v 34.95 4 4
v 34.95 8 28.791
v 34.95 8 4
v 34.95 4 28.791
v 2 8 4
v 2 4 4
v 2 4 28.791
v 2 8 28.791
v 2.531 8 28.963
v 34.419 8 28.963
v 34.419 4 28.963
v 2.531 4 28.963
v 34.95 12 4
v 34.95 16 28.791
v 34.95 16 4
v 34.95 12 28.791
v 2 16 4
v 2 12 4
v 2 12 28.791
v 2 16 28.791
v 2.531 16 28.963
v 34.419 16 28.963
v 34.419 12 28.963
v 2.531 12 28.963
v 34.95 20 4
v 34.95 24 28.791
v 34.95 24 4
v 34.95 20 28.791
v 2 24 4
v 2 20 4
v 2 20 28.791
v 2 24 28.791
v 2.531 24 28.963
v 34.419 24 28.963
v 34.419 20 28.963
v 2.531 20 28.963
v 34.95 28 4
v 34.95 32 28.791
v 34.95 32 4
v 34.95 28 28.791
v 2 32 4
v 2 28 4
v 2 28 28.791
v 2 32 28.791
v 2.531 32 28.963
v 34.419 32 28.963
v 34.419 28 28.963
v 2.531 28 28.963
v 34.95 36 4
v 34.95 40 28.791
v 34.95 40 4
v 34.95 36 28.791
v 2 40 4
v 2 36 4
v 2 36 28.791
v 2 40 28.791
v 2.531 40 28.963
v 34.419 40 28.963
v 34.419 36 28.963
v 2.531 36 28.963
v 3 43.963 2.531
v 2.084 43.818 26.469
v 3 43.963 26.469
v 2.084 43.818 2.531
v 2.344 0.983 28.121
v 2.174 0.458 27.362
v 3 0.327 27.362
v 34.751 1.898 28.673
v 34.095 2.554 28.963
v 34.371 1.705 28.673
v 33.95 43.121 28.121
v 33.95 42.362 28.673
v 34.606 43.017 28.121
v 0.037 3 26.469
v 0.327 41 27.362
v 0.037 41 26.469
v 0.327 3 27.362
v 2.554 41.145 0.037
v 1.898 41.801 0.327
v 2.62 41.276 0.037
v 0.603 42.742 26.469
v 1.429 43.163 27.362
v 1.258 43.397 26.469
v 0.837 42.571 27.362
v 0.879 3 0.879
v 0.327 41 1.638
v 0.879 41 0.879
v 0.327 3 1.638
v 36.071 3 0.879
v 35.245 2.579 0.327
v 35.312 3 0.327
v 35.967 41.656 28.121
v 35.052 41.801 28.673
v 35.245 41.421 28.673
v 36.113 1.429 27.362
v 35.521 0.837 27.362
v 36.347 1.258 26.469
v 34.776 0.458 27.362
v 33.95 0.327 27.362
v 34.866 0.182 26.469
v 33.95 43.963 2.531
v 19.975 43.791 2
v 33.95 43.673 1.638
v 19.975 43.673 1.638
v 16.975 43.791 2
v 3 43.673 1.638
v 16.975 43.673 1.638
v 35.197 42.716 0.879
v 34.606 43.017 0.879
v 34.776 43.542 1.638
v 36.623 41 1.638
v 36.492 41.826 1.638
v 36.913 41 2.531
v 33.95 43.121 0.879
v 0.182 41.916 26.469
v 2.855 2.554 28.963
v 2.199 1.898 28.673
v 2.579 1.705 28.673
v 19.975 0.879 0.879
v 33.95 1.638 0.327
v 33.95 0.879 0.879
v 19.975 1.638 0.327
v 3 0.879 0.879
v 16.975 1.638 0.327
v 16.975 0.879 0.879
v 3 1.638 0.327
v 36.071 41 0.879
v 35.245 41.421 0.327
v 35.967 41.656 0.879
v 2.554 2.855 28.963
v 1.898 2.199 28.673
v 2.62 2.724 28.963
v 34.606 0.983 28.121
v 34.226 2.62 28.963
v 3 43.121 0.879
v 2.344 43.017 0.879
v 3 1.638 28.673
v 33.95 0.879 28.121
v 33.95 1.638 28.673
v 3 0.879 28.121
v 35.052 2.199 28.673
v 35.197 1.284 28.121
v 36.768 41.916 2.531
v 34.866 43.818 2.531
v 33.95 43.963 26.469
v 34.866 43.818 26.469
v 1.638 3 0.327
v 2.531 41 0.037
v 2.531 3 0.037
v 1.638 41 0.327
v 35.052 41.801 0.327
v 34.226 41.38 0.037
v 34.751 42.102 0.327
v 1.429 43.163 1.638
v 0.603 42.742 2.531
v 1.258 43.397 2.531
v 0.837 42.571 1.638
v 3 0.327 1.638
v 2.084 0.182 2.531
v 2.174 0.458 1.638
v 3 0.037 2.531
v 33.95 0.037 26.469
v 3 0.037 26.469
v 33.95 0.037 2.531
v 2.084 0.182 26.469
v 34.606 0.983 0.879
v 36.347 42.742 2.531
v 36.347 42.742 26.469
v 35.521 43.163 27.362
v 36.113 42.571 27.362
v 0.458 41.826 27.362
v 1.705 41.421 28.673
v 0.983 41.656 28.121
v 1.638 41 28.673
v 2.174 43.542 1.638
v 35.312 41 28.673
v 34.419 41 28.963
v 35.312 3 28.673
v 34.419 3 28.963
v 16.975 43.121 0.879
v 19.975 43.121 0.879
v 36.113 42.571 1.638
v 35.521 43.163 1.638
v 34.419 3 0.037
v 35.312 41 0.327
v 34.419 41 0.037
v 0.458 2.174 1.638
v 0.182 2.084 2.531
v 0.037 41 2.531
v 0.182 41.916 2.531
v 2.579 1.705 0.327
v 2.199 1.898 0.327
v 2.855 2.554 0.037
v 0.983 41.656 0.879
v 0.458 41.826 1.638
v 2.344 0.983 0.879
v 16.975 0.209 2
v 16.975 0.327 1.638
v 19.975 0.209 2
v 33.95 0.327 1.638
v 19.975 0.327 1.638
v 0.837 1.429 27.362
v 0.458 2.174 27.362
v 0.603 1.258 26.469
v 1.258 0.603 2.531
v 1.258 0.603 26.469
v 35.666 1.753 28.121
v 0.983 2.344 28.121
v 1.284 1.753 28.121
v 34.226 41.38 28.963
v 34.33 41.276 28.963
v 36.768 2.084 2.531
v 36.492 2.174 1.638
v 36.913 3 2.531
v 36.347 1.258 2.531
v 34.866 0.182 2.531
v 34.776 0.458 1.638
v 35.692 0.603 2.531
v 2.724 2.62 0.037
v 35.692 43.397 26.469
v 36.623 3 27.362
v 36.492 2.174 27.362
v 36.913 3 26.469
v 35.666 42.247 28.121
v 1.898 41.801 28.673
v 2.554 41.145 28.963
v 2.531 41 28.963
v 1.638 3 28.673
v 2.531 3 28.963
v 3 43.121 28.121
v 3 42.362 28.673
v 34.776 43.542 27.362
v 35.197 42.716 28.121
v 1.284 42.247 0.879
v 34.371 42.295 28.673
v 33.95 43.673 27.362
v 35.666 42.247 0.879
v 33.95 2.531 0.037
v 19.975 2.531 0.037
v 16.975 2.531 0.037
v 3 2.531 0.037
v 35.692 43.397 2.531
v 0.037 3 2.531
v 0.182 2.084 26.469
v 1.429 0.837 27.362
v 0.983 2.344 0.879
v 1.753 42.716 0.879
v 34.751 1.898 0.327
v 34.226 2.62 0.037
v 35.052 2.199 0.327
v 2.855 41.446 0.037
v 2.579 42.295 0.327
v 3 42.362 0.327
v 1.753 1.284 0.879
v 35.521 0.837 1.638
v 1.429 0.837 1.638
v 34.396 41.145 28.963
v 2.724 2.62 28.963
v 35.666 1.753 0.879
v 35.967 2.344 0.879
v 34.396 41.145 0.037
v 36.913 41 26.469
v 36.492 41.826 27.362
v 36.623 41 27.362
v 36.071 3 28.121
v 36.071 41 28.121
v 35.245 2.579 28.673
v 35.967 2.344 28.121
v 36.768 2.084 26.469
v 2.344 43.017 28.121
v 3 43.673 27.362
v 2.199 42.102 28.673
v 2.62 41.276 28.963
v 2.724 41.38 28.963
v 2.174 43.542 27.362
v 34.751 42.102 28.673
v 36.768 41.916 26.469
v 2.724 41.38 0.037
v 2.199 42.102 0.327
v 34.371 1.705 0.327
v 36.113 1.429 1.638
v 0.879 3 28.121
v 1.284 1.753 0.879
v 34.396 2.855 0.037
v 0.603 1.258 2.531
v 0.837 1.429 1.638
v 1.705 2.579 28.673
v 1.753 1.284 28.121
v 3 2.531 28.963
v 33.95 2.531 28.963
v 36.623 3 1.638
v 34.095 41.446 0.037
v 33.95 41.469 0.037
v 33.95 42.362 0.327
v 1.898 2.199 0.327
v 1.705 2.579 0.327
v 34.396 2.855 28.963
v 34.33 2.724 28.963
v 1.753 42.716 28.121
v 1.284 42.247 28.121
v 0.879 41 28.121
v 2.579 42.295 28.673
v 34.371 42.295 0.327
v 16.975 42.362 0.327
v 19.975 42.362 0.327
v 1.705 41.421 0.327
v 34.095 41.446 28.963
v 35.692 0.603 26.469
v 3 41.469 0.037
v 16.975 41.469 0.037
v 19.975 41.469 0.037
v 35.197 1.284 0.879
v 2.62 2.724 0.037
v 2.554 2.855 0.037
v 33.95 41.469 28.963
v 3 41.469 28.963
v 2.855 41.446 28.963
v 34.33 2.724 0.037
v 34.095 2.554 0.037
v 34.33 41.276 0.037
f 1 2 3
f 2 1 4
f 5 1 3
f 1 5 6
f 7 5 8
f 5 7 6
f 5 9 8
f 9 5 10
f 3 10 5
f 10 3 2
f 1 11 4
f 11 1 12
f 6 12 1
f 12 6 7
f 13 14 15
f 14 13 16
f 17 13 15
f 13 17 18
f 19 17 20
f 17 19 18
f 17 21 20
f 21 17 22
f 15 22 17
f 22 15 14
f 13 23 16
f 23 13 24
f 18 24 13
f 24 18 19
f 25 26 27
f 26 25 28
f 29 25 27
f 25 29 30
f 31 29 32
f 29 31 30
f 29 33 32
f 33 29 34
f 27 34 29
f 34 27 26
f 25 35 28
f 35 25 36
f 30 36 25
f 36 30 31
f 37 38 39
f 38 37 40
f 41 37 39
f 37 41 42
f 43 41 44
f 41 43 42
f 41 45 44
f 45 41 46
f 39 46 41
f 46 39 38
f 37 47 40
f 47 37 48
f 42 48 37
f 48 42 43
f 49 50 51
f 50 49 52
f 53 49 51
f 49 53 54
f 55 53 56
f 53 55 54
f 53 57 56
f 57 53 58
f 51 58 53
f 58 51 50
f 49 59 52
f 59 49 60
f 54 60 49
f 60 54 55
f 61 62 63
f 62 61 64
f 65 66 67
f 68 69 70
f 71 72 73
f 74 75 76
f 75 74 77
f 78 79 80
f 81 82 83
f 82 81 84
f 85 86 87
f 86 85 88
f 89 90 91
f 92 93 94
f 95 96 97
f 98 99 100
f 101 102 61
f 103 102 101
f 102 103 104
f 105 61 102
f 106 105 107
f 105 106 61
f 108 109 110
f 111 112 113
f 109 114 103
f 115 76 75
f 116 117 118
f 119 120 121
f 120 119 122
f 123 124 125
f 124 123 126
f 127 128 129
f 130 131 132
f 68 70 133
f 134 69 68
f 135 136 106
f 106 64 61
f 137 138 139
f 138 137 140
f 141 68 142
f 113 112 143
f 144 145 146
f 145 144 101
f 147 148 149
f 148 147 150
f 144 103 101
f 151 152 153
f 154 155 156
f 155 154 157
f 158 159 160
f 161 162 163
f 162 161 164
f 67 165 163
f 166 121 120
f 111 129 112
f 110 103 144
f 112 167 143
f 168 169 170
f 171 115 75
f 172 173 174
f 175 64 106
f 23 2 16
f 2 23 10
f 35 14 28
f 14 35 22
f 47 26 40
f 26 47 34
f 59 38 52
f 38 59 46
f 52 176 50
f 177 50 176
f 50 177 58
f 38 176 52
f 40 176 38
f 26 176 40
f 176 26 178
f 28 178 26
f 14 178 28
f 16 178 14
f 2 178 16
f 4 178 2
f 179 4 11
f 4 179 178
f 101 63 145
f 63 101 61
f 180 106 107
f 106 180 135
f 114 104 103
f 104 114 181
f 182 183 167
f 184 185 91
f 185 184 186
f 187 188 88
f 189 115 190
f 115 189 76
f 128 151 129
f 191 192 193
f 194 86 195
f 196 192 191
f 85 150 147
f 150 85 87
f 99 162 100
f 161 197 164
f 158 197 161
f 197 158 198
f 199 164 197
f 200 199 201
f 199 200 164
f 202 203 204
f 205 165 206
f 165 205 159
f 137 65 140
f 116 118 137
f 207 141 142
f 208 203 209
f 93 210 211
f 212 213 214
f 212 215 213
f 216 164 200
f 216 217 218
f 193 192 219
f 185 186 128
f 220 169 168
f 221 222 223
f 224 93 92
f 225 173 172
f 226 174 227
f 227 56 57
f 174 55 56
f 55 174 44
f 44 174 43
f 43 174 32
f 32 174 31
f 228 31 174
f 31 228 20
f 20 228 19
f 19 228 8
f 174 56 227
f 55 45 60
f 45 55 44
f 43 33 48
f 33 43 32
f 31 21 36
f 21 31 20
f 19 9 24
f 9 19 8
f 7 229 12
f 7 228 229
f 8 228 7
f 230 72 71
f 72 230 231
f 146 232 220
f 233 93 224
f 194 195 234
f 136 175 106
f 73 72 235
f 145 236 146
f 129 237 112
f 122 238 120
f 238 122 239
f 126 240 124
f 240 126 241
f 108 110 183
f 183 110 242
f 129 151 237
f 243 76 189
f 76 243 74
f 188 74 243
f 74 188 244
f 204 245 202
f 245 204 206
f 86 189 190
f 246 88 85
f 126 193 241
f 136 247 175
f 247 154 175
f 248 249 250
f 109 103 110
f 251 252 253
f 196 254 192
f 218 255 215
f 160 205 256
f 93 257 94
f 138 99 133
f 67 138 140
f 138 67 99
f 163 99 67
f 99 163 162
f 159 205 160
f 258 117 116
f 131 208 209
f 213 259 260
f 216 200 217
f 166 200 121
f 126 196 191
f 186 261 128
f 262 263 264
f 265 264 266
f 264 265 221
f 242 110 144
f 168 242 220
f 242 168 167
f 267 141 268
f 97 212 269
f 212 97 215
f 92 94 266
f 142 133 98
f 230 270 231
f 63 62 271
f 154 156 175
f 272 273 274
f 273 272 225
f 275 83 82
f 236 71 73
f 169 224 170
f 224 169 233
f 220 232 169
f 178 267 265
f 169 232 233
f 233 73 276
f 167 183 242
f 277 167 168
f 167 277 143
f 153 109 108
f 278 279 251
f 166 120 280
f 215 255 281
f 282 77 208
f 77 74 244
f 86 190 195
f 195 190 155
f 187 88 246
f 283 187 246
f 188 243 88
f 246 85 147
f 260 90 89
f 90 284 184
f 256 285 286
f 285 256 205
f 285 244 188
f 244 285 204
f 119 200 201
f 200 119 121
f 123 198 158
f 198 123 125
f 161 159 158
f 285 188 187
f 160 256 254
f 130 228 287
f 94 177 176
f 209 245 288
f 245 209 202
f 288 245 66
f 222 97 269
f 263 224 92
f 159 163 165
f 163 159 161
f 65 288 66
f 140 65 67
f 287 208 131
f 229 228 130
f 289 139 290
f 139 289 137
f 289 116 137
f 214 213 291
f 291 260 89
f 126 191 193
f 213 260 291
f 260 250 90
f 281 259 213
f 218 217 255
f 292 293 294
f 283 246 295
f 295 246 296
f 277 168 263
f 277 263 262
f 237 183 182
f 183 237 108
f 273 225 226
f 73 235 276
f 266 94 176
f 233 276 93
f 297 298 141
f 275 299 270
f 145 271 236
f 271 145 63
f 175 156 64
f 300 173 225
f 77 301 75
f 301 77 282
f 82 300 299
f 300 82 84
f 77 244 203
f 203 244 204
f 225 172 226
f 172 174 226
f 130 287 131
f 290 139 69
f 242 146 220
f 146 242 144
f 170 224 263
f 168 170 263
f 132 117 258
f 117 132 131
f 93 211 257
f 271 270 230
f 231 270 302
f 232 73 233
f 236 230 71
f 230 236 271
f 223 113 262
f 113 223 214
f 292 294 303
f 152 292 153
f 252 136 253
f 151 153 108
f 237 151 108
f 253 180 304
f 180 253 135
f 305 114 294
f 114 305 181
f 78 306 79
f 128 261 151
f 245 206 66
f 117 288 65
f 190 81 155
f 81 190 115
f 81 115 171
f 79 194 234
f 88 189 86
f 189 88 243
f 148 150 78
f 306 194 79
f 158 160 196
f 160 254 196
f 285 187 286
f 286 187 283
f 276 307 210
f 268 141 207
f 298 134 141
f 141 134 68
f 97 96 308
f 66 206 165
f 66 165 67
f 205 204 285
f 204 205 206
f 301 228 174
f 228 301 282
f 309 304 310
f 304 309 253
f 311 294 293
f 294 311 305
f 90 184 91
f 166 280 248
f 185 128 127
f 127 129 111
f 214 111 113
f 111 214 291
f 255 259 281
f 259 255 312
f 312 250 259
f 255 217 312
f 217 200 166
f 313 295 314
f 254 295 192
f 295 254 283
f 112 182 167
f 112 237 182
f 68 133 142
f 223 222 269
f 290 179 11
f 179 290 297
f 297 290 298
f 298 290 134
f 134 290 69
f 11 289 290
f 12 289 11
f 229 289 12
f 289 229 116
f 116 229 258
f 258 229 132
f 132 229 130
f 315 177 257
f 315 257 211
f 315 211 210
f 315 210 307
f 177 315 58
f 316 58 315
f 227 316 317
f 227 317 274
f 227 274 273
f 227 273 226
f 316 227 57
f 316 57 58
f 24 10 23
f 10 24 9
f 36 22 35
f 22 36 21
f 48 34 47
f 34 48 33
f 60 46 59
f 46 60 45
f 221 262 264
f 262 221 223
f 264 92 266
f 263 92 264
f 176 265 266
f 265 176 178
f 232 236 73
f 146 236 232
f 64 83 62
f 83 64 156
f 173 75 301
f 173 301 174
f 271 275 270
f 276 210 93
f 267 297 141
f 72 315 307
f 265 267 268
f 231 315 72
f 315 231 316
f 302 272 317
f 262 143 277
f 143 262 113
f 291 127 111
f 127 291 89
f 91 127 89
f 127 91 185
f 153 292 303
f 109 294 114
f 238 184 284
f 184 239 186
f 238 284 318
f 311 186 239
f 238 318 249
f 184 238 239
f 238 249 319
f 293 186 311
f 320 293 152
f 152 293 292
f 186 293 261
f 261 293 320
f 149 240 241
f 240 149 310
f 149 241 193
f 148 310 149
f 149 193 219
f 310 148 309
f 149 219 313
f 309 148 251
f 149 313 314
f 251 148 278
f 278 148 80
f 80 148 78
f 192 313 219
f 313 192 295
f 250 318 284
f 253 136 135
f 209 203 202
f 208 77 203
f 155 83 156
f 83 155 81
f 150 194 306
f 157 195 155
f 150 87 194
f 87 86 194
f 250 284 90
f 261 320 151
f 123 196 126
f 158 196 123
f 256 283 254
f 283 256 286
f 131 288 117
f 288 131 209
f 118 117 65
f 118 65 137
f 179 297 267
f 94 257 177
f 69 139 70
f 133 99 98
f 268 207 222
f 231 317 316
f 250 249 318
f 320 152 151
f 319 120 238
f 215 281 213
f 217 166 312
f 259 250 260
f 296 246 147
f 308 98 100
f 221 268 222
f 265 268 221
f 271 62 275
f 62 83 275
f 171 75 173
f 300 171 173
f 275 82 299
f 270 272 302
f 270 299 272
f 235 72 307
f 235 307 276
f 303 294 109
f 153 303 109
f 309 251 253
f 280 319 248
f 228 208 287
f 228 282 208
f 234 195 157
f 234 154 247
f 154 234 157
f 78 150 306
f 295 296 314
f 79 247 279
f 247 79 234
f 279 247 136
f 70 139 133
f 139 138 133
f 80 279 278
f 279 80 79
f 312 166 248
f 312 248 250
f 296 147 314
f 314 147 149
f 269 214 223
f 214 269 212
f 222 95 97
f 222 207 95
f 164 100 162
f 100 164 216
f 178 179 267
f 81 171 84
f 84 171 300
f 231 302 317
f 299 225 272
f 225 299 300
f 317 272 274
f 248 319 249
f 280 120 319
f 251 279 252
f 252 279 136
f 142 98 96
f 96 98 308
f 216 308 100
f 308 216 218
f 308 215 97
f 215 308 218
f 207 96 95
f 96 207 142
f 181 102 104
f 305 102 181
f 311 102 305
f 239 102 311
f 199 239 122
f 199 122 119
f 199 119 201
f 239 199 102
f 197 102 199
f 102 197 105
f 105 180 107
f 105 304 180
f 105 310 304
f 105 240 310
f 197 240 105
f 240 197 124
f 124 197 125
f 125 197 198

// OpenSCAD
//Constants
stuffz = 2/1;
fuzz = 0.2/1;
real_card_length = 34.95/1;
real_card_width = 32.75/1;
real_card_thick = 3.8/1;
card_length = real_card_length + fuzz;
card_width = real_card_width + fuzz;
card_thick = real_card_thick + fuzz;

//DS Box
box_height_addition = 25; //[10: 32]
gutter_height = 2; //[1:5]
gutter_width = 3; //[1:5]
number_of_cards = 5; //[1:20]
card_spacing = 4; //[2:7]
$fn = 20;
cube_r = 3; //[1 : 5]

box(number_of_cards);

module card(){
  cube([card_width,card_thick,card_length]);
}

module box(number){
  box_x = card_width + stuffz*2;
  box_y = card_spacing + (card_thick + card_spacing) * number;
  box_z = gutter_height+ stuffz + box_height_addition;
  card_x_trans = box_x / 2 - card_width /2;
  //%cube([box_x, box_y, box_z]);
  difference(){
    roundCornerCube(box_x,box_y,box_z,cube_r);
    //gutter
    translate([(box_x/2) - (gutter_width/2),-fuzz,-fuzz]) 
    cube([gutter_width, box_y + (fuzz*2),gutter_height+fuzz]);
    //cards
    for (i = [0 : number-1]){
      #translate([card_x_trans, card_spacing + (card_thick + card_spacing)*i,gutter_height+stuffz]) card();
    }
  }
}

module roundCornerCube(x,y,z,r_sphere){
r = r_sphere;
if (x < r) {echo ("roundCornerCube: error: x < r !!");}
if (y < r) {echo ("roundCornerCube: error: y < r !!");}
if (z < r) {echo ("roundCornerCube: error: z < r !!");}
	hull(){
		translate([r,y-r,z-r]) sphere(r_sphere); //1!
		translate([x-r,y-r,z-r]) sphere(r_sphere); //2
		translate([r,r,z-r]) sphere(r_sphere); //3
		translate([x-r,r,z-r]) sphere(r_sphere); //4
		translate([r,y-r,r]) sphere(r_sphere); //5!
		translate([x-r,y-r,r]) sphere(r_sphere); //6		
		translate([r,r,r]) sphere(r_sphere); //7
		translate([x-r,r,r]) sphere(r_sphere); //8
	}
}
